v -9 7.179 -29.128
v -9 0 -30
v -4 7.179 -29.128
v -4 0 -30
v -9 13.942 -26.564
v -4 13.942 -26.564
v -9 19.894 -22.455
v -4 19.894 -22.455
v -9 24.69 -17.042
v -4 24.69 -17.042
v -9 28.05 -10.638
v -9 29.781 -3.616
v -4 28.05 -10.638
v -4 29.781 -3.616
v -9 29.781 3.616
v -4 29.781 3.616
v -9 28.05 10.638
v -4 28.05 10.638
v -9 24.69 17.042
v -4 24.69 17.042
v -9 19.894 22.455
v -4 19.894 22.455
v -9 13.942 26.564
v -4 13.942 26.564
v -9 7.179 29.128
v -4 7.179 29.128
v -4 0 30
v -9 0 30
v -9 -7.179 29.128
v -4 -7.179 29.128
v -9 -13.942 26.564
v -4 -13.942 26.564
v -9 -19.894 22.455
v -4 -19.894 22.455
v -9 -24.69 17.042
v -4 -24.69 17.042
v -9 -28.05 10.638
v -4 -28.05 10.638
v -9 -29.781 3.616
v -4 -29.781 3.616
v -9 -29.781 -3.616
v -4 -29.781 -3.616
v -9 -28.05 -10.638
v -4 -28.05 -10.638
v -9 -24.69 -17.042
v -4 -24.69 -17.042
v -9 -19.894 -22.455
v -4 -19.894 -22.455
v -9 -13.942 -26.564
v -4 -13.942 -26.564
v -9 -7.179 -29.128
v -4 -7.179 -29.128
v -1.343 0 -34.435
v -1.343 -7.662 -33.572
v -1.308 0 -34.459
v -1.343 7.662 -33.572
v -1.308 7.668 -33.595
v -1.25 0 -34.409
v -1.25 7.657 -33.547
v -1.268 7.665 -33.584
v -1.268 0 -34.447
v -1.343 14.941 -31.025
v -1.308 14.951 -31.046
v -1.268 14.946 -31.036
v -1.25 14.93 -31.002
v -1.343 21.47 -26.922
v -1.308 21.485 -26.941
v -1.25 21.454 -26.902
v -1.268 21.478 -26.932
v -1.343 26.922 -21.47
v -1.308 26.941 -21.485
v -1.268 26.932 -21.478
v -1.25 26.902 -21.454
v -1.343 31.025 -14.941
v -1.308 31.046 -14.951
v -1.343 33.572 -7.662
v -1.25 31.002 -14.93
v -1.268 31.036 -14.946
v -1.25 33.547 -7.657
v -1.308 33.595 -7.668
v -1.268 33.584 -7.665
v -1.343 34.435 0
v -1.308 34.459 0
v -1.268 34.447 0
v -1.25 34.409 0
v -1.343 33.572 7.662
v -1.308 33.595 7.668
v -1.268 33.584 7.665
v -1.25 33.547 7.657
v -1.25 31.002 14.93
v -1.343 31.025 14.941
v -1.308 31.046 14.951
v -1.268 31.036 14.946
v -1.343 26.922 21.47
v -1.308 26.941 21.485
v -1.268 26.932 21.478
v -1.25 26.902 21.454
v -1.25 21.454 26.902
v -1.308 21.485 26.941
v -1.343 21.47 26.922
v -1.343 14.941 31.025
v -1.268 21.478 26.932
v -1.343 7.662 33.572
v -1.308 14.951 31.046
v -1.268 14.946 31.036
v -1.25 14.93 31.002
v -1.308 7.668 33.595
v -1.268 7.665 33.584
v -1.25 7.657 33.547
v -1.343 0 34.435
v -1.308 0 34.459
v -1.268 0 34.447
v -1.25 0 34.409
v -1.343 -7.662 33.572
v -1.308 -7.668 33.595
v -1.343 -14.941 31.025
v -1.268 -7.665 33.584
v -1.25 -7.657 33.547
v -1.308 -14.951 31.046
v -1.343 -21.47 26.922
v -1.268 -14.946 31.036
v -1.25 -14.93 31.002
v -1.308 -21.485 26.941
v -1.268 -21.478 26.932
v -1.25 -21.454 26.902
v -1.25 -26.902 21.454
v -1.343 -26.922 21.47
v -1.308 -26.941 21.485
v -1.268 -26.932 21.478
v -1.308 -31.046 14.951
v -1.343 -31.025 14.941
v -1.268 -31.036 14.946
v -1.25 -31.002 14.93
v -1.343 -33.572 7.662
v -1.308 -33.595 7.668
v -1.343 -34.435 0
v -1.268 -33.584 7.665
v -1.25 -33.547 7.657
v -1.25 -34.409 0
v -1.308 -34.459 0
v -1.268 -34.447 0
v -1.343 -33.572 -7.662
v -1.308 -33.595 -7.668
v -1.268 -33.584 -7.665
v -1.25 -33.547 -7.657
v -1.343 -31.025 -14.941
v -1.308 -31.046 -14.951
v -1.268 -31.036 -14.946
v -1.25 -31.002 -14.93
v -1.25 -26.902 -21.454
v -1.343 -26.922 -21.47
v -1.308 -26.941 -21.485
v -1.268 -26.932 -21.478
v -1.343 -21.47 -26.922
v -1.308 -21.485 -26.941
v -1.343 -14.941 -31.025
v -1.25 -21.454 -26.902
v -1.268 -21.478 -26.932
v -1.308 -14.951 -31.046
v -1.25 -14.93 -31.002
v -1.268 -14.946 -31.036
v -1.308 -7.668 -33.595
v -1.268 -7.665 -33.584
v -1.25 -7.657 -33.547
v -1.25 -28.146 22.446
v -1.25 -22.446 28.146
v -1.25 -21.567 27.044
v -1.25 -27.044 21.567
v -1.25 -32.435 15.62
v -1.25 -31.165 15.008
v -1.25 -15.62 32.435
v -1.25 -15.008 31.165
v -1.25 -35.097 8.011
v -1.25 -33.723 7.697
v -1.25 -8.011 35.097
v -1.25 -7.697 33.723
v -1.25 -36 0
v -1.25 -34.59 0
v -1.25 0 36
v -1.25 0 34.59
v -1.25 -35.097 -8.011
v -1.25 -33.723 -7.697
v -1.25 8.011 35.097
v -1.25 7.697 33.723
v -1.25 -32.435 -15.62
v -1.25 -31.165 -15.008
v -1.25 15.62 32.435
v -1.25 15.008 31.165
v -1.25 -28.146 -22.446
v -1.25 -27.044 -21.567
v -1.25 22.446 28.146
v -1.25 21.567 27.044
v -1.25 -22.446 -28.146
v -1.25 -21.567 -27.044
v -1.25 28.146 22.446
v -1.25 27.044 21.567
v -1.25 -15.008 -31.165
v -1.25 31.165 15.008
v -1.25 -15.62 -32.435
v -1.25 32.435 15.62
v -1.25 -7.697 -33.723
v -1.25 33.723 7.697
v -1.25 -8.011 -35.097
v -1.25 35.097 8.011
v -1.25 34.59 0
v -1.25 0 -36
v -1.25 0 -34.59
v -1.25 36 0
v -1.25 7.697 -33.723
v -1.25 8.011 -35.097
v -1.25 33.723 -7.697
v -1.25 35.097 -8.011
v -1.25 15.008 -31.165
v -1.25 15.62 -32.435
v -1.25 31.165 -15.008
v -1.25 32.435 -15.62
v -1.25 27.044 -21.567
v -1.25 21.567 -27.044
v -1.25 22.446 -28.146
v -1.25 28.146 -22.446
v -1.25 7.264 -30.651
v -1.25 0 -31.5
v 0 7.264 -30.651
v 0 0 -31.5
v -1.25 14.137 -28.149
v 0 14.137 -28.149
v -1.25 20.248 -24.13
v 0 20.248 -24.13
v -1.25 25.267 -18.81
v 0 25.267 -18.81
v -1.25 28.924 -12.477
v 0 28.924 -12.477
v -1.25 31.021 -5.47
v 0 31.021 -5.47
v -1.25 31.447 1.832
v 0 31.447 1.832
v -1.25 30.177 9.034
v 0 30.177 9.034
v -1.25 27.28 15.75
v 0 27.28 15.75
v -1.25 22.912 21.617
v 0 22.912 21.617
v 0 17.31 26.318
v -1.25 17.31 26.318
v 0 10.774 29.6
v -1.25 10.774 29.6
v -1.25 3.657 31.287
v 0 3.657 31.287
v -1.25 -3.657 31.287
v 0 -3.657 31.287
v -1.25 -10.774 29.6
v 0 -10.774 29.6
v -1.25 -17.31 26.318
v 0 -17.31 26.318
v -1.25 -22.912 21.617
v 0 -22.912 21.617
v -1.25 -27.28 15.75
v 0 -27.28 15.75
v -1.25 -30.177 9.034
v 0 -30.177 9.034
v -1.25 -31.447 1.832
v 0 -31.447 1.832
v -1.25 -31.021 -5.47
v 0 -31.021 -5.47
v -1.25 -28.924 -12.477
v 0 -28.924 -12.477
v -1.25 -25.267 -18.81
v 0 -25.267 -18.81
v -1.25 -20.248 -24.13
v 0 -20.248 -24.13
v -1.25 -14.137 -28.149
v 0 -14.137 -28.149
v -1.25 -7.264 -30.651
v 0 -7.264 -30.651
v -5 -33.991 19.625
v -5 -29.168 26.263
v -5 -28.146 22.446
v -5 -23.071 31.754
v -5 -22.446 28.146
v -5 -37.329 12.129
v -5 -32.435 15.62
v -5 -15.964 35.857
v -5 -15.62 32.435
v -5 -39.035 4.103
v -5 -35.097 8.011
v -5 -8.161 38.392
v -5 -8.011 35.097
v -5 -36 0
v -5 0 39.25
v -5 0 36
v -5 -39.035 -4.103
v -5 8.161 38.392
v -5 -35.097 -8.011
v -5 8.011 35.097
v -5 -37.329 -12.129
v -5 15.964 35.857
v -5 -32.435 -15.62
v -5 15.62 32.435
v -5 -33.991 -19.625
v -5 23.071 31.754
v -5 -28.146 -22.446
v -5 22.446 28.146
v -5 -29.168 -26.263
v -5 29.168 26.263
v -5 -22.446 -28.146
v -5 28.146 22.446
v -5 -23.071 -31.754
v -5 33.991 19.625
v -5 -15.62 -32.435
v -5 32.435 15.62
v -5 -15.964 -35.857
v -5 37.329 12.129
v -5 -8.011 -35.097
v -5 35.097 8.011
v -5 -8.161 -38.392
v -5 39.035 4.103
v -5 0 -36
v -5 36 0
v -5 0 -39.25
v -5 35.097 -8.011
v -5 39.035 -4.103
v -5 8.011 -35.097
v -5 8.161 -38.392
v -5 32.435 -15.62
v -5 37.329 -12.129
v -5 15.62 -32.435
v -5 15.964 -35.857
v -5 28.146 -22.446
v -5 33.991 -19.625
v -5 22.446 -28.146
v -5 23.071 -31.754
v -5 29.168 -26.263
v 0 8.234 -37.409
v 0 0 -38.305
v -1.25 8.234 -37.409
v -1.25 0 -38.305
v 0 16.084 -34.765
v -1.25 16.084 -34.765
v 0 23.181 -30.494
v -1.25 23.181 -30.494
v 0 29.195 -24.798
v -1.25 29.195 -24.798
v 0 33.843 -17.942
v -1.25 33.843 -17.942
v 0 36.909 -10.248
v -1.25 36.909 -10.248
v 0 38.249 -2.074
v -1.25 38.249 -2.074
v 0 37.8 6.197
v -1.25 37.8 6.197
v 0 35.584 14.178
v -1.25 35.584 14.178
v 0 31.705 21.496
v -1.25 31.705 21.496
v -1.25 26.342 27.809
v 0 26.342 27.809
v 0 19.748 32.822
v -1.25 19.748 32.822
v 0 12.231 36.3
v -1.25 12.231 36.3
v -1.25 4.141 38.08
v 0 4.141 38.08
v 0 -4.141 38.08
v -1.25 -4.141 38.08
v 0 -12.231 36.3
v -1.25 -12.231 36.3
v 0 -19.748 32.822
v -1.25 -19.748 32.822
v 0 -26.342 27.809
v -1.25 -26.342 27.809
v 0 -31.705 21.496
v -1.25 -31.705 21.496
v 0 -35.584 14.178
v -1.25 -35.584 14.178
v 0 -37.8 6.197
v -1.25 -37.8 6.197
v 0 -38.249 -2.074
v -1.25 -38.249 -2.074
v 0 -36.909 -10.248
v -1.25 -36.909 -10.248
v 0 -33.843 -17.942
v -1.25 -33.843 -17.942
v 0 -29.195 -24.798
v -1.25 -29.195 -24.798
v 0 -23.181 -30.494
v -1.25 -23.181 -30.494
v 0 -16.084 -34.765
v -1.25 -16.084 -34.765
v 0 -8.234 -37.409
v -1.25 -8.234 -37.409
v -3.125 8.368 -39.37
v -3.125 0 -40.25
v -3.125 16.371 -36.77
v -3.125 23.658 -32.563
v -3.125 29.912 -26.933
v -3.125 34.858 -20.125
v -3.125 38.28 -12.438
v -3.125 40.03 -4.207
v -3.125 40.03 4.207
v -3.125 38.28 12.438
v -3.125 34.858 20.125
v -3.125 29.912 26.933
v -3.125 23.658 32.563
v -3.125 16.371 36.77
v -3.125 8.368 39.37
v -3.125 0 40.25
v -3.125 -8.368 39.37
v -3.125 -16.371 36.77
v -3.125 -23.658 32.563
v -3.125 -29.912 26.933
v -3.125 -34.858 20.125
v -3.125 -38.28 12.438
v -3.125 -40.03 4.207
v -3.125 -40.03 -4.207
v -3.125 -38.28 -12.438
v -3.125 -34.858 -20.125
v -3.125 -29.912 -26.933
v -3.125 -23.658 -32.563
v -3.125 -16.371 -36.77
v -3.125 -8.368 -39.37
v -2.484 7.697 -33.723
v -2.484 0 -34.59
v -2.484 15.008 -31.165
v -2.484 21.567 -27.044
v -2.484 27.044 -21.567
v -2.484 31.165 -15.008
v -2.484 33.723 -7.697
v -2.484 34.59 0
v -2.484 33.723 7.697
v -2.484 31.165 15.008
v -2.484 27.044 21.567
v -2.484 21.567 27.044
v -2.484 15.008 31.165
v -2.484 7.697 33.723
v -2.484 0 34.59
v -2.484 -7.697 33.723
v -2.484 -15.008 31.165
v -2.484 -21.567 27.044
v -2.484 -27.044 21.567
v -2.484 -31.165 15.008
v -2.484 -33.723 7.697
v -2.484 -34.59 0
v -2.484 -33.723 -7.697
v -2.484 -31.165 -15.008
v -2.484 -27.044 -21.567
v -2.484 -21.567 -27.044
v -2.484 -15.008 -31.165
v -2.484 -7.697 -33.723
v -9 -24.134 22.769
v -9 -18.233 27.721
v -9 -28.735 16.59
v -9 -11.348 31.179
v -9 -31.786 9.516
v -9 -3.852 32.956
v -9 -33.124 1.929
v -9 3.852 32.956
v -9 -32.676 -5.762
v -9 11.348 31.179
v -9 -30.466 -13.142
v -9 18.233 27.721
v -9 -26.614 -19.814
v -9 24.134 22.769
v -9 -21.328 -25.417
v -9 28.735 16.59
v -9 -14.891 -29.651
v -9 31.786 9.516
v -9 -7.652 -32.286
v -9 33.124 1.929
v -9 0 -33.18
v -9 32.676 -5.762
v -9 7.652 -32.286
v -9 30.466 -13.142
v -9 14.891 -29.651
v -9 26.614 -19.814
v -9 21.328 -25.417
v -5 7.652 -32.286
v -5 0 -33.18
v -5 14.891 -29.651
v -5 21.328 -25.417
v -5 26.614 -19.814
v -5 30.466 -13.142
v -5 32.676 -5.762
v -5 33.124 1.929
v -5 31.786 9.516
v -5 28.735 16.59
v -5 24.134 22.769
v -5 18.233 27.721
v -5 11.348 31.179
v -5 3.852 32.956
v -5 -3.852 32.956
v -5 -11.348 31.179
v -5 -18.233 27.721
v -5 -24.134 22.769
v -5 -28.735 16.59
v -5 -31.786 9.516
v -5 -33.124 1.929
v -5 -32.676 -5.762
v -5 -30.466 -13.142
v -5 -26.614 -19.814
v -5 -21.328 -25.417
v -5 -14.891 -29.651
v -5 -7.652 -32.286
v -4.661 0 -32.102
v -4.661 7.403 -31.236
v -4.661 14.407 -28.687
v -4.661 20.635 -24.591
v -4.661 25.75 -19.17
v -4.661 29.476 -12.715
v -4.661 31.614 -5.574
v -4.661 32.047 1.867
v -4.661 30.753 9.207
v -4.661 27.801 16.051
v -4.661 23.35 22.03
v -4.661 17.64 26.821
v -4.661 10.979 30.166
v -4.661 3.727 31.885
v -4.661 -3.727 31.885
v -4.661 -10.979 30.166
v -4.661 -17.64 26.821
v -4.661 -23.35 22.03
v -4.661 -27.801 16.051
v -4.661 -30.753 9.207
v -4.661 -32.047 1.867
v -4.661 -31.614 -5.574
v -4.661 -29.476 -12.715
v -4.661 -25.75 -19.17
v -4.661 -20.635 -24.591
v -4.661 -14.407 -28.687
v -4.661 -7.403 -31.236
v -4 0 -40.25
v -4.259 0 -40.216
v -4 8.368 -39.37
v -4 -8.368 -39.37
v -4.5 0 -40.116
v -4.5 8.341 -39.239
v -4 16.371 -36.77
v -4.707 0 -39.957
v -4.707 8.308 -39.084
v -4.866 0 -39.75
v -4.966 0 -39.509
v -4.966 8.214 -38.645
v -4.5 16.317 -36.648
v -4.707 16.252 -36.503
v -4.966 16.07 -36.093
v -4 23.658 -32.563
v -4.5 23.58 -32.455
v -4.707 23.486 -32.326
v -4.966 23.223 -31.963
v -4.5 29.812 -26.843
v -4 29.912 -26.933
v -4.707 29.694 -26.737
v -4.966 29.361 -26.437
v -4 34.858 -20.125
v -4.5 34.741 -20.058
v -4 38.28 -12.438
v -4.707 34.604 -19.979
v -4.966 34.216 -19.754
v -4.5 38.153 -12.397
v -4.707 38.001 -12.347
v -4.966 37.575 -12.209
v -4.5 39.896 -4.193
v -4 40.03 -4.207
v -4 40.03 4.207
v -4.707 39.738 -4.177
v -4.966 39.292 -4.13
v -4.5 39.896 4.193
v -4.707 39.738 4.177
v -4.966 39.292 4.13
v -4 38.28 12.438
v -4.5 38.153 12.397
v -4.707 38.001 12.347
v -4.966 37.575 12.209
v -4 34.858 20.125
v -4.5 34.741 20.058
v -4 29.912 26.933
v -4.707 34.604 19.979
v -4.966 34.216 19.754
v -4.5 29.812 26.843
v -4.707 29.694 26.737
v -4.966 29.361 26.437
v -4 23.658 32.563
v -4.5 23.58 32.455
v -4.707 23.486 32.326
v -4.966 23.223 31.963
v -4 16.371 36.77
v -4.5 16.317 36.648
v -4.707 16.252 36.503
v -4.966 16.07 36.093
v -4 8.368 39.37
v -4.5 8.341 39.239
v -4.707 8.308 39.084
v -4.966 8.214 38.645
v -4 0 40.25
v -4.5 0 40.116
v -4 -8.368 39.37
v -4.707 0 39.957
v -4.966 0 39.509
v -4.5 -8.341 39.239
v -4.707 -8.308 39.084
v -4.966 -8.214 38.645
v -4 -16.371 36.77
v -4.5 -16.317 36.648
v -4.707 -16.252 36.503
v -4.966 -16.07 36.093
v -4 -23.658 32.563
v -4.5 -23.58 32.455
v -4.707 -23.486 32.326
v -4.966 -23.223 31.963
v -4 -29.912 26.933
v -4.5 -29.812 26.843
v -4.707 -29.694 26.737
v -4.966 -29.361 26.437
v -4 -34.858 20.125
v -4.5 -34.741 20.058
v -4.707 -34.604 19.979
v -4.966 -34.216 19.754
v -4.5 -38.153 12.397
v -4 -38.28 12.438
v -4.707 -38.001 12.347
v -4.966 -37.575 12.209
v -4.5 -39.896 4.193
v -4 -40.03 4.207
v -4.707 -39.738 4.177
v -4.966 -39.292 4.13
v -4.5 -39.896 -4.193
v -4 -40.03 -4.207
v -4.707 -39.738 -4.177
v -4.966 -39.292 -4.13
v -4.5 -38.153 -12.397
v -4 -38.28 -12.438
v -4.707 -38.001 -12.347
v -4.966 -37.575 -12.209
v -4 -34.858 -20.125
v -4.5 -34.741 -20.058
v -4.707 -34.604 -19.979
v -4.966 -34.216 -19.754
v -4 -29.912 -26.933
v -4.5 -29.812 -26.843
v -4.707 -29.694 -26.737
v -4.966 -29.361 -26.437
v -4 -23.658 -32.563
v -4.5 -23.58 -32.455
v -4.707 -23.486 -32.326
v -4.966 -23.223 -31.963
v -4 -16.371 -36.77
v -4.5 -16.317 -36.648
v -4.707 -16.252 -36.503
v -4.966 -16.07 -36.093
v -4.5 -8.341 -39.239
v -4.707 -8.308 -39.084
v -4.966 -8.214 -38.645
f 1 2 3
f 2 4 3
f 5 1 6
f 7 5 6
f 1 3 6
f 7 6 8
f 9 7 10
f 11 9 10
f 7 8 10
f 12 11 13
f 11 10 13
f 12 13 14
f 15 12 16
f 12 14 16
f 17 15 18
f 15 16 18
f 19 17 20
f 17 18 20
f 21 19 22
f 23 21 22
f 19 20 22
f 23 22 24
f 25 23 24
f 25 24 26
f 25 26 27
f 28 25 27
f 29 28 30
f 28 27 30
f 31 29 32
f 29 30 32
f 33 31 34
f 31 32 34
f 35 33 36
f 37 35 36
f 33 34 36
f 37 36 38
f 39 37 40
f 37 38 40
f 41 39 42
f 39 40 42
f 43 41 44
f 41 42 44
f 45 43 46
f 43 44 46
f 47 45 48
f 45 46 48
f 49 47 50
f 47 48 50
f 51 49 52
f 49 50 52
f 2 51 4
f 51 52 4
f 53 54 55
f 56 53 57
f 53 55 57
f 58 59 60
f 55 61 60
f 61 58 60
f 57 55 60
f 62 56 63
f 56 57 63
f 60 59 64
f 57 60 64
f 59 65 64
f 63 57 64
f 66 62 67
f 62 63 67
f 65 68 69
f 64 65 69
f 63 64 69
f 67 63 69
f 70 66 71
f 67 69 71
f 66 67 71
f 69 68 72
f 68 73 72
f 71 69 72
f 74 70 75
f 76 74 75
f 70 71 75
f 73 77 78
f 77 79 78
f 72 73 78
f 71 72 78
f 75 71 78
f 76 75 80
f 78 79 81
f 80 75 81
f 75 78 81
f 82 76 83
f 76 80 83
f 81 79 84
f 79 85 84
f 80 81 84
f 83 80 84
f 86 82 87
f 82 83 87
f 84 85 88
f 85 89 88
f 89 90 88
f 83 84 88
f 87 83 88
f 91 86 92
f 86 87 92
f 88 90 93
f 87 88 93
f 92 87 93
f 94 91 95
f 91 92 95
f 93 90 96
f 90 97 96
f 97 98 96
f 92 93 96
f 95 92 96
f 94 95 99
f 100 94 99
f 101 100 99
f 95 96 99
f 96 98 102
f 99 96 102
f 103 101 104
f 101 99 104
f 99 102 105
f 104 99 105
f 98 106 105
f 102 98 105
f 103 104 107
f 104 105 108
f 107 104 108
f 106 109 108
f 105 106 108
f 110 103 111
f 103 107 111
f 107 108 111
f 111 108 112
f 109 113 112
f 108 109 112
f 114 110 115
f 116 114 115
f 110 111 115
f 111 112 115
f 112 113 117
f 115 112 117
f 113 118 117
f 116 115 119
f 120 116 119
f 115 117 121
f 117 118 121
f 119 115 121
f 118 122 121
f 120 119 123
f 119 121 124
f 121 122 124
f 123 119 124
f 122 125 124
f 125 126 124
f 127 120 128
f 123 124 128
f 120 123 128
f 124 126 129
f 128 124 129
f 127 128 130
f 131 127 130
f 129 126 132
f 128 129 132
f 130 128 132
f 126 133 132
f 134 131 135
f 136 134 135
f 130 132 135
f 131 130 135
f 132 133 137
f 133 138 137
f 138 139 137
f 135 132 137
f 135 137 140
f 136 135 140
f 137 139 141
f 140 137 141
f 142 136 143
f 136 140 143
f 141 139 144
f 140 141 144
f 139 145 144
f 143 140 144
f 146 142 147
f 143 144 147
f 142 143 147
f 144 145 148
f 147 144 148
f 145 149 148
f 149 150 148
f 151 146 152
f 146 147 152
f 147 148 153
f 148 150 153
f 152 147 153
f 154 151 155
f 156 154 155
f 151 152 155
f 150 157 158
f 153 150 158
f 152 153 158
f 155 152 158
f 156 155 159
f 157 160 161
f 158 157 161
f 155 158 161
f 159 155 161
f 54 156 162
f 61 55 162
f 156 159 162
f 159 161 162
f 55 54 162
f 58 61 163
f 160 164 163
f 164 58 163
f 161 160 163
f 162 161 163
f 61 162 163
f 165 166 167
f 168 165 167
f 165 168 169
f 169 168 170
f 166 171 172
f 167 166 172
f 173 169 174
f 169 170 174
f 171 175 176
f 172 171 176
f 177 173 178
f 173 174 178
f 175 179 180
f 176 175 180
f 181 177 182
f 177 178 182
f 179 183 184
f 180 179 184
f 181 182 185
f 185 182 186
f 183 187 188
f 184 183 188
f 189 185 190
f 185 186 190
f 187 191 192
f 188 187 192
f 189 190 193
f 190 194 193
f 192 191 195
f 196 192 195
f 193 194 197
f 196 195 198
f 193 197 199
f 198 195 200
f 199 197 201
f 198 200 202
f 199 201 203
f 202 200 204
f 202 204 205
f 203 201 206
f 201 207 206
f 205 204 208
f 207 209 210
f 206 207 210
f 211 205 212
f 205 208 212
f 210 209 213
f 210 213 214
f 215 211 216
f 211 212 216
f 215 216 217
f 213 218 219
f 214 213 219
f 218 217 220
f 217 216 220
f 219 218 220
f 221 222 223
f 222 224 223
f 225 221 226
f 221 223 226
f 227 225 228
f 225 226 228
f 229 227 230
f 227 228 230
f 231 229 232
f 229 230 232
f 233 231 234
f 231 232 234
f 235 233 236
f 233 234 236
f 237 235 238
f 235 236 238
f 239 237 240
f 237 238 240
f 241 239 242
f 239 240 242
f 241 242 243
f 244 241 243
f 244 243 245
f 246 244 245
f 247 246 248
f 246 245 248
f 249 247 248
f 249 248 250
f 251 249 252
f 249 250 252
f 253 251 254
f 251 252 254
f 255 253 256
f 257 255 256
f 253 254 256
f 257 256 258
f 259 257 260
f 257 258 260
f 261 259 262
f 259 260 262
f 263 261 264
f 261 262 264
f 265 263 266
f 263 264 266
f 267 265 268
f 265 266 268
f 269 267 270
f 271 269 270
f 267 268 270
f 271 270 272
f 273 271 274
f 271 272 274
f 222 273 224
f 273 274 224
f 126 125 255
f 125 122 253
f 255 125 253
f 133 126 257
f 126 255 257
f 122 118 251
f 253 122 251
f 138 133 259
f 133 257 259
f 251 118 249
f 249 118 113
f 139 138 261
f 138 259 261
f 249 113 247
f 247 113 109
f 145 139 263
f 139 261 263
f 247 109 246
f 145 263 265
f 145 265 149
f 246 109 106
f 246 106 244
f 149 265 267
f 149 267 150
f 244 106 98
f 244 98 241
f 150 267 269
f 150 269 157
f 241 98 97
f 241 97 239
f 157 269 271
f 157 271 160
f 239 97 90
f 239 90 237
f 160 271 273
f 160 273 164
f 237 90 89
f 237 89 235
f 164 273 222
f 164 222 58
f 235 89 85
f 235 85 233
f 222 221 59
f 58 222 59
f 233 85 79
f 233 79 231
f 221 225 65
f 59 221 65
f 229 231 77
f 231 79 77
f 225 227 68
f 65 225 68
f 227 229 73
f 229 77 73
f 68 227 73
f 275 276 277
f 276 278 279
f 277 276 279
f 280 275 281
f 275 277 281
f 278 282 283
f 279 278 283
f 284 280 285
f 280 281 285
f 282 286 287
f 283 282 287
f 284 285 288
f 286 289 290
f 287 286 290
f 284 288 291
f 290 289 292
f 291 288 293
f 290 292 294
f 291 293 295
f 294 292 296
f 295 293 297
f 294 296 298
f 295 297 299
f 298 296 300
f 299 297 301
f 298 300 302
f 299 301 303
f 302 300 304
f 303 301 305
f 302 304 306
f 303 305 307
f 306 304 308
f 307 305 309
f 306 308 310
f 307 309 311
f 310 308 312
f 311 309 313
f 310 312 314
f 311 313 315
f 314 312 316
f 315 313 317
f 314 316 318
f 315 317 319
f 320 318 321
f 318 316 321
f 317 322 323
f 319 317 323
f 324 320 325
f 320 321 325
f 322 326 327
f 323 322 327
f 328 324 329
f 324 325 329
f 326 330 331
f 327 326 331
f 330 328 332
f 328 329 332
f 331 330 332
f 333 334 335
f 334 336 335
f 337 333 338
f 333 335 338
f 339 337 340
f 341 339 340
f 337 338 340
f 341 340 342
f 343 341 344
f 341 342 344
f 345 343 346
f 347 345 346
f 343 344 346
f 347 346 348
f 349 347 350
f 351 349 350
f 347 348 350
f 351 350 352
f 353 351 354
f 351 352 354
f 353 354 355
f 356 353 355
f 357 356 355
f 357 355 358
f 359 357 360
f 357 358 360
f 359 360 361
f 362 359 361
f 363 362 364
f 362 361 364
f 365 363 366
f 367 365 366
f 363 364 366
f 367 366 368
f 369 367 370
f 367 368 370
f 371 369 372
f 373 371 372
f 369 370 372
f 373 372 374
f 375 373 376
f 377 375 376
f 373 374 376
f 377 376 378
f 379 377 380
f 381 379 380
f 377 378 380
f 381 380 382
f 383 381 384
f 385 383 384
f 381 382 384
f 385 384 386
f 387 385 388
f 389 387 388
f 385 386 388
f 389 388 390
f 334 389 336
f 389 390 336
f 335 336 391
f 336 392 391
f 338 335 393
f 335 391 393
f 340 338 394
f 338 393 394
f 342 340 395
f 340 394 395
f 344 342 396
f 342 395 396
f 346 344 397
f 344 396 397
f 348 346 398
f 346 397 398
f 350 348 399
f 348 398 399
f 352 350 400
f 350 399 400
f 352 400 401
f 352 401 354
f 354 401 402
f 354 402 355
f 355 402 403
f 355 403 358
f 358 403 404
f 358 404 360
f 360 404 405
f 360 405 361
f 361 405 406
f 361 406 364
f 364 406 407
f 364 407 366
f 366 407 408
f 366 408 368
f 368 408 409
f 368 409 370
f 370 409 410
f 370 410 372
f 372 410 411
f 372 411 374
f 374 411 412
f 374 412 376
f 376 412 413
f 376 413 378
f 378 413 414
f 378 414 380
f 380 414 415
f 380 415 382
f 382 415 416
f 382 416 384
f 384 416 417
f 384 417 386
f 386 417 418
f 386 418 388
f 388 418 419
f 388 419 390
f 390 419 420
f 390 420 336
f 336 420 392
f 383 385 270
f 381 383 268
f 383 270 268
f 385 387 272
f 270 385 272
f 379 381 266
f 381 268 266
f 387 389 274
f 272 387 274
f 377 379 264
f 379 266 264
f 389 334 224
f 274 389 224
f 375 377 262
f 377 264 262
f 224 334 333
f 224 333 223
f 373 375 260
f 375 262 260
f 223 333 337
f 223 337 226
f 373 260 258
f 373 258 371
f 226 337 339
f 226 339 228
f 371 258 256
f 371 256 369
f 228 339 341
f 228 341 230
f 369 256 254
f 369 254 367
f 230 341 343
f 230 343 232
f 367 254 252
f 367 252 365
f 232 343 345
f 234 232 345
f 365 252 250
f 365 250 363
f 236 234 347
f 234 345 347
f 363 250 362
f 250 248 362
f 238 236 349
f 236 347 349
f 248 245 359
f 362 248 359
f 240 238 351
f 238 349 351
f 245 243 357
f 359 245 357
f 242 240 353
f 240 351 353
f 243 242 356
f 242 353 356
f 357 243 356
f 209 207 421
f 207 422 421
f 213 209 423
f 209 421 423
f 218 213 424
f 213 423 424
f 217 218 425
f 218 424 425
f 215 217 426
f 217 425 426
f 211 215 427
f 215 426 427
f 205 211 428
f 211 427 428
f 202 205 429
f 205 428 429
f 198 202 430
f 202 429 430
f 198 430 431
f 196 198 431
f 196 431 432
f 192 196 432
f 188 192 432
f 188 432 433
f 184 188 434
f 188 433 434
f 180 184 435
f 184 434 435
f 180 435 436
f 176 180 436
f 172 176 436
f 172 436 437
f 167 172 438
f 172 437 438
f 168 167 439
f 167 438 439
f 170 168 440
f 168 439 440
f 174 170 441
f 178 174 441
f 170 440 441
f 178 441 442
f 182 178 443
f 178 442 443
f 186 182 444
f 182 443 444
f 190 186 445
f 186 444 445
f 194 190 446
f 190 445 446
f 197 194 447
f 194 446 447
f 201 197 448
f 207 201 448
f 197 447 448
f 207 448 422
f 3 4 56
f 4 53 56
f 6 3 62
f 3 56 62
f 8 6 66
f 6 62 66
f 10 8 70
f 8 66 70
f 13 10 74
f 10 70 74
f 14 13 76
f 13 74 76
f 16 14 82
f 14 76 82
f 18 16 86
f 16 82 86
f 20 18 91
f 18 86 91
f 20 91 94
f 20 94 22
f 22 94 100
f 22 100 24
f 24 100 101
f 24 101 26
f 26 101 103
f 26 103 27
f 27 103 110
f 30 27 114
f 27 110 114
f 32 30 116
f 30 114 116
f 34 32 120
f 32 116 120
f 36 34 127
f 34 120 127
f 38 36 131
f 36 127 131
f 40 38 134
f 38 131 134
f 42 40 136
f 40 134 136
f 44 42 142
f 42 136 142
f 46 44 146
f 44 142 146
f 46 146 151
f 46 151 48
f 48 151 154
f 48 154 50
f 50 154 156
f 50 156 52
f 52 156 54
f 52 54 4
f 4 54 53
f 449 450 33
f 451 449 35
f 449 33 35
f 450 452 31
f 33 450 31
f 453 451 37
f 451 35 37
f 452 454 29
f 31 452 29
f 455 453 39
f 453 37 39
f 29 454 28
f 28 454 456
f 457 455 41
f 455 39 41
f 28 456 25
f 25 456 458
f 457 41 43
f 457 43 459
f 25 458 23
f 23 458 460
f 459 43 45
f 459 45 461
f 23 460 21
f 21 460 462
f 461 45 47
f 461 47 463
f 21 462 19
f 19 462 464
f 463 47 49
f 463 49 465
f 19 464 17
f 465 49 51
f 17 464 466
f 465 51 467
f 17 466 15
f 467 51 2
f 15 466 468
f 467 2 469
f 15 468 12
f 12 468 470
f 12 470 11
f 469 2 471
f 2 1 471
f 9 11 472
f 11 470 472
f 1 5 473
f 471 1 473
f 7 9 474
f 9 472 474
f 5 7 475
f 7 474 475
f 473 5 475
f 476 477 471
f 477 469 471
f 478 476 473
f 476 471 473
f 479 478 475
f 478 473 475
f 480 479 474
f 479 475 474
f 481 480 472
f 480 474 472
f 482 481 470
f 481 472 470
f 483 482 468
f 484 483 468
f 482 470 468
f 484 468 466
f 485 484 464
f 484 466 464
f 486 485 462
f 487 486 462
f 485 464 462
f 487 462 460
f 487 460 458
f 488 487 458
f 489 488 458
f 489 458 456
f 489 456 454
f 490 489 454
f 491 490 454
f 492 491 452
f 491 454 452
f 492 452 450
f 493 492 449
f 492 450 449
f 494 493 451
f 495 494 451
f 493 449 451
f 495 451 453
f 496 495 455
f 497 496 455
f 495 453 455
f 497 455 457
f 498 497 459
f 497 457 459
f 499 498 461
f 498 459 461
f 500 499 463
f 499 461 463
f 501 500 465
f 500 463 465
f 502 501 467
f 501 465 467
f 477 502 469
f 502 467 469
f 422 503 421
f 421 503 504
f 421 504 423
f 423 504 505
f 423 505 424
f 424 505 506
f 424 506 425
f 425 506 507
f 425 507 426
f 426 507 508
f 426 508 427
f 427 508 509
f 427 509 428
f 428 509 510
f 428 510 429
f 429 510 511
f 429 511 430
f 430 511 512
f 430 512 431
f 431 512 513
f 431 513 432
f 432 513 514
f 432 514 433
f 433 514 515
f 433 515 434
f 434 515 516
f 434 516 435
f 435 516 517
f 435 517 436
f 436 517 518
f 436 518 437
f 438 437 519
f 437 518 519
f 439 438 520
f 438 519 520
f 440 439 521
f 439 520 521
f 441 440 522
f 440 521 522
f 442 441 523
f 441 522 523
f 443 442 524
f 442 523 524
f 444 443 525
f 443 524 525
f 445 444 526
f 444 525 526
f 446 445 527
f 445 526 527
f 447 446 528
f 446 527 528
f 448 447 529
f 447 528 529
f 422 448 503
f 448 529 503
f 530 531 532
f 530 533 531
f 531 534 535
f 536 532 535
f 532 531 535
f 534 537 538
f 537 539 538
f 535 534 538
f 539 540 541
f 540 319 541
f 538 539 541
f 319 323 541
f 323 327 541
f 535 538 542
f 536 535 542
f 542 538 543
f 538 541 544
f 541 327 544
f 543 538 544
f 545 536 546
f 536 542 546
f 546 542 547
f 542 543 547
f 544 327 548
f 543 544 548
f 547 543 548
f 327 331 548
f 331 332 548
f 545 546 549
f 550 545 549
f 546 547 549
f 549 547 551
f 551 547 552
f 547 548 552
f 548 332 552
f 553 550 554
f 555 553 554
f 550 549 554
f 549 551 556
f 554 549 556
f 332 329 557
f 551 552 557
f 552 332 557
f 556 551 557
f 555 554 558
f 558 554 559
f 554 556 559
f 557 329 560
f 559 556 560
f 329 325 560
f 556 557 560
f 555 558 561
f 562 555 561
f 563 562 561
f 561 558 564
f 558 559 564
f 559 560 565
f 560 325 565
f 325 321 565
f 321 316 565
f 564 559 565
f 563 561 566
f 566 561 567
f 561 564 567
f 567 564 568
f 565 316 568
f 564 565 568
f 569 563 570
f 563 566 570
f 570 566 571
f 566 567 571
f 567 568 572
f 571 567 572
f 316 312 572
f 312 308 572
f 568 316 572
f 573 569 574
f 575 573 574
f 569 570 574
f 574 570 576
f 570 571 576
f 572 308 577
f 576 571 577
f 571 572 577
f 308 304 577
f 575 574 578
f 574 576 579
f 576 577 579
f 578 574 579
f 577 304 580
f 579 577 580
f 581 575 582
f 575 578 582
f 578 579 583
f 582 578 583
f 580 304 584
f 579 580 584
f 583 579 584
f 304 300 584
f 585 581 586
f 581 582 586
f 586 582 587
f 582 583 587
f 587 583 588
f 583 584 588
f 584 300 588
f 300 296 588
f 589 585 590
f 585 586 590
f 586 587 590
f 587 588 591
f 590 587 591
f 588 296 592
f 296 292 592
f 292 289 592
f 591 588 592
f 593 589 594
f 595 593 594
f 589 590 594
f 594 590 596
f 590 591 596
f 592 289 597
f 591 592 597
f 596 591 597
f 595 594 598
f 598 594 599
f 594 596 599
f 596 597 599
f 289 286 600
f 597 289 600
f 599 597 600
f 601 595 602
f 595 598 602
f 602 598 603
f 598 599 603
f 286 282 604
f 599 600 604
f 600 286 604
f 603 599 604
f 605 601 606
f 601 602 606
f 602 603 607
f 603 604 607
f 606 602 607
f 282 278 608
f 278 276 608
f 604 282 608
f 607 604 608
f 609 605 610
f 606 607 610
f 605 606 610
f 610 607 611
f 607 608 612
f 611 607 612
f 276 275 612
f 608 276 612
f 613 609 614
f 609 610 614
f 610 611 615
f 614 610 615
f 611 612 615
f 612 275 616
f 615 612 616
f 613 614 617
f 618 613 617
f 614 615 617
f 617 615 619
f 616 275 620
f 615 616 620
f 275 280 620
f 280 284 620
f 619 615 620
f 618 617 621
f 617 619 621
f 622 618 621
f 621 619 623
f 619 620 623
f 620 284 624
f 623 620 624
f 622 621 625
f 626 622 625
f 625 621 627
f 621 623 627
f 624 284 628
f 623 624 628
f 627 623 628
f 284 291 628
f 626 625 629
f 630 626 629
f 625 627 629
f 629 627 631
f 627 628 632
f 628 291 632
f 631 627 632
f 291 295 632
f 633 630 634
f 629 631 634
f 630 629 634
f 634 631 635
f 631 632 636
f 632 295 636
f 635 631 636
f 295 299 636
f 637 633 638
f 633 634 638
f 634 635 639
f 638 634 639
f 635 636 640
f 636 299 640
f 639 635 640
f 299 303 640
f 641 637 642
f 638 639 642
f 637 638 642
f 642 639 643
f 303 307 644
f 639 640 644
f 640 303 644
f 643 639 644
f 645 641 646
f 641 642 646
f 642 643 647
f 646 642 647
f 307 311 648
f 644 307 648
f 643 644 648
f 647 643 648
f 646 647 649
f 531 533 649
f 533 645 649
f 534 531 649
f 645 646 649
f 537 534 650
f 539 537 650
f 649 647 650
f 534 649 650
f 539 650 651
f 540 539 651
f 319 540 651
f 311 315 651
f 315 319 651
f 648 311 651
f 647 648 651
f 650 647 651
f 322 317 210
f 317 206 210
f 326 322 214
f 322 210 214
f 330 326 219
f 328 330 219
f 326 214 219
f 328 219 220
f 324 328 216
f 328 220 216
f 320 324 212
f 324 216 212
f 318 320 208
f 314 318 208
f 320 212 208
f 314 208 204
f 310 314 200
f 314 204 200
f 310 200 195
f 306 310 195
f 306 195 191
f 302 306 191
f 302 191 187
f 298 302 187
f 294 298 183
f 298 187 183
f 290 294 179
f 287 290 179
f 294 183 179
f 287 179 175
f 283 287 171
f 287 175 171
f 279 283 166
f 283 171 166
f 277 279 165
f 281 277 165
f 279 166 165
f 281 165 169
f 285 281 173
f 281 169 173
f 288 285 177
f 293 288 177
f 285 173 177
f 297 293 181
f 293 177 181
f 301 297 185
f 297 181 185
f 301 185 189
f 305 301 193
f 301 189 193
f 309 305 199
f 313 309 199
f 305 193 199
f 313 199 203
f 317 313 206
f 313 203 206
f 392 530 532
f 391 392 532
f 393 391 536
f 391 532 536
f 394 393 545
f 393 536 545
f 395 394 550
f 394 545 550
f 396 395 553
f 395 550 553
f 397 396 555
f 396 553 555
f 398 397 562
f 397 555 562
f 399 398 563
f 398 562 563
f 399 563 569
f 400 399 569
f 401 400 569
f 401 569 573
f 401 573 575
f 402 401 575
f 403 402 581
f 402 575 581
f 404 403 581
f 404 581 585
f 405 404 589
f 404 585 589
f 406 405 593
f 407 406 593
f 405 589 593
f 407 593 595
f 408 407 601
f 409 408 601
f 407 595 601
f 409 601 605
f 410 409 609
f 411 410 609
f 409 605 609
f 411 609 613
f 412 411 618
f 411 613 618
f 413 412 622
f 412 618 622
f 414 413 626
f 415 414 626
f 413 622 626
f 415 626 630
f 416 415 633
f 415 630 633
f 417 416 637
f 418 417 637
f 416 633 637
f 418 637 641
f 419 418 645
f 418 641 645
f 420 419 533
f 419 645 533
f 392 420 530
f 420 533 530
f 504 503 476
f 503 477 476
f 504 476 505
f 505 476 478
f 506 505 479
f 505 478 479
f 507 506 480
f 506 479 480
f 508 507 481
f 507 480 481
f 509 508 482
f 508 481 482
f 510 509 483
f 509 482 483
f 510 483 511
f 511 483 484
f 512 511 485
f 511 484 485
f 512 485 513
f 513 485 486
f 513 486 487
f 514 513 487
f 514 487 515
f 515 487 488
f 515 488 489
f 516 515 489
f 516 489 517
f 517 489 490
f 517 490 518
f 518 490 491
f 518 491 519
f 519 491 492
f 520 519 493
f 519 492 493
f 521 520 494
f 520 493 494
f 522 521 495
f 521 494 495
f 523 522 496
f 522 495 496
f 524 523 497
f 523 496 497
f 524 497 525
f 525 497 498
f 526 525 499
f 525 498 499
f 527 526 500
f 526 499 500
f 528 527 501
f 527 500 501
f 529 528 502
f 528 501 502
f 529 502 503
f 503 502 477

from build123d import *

# Parameters (mm, degrees)
FILLET1_R = 1


with BuildPart() as part:
    # Sketch1 → Revolve1 (revolve)
    with BuildSketch(Plane.XY, mode=Mode.PRIVATE) as revolve1_sk:
        with BuildLine():
            Line((-1.25, 38.305), (-3.125, 40.25))
            Line((-3.125, 40.25), (-5, 40.25))
            Line((-5, 40.25), (-5, 36))
            Line((-5, 36), (-1.25, 36))
            Line((-1.25, 36), (-1.25, 34.59))
            Line((-1.25, 34.59), (-2.48375, 34.59))
            Line((-2.48375, 34.59), (-4.660938533, 32.101784534))
            Line((-4.660938533, 32.101784534), (-5, 33.18))
            Line((-5, 33.18), (-9, 33.18))
            Line((-9, 33.18), (-9, 30))
            Line((-9, 30), (-4, 30))
            Line((-4, 30), (-1.342891128, 34.434956263))
            ThreePointArc((-1.342891128, 34.434956263), (-1.286668766, 34.457448986), (-1.25, 34.409258964))
            Line((-1.25, 34.409258964), (-1.25, 31.5))
            Line((-1.25, 31.5), (0, 31.5))
            Line((0, 31.5), (0, 38.305))
            Line((0, 38.305), (-1.25, 38.305))
        make_face()
    revolve(revolve1_sk.sketch.rotate(Axis((-9, 0, 0), (1, 0, 0)), 270), axis=Axis((-9, 0, 0), (1, 0, 0)))

    # Fillet1
    fillet1_edges = [part.edges().sort_by_distance(p)[0] for p in [
        (-5, 0, 40.25),
    ]]
    fillet(fillet1_edges, radius=FILLET1_R)


solid = part.part
